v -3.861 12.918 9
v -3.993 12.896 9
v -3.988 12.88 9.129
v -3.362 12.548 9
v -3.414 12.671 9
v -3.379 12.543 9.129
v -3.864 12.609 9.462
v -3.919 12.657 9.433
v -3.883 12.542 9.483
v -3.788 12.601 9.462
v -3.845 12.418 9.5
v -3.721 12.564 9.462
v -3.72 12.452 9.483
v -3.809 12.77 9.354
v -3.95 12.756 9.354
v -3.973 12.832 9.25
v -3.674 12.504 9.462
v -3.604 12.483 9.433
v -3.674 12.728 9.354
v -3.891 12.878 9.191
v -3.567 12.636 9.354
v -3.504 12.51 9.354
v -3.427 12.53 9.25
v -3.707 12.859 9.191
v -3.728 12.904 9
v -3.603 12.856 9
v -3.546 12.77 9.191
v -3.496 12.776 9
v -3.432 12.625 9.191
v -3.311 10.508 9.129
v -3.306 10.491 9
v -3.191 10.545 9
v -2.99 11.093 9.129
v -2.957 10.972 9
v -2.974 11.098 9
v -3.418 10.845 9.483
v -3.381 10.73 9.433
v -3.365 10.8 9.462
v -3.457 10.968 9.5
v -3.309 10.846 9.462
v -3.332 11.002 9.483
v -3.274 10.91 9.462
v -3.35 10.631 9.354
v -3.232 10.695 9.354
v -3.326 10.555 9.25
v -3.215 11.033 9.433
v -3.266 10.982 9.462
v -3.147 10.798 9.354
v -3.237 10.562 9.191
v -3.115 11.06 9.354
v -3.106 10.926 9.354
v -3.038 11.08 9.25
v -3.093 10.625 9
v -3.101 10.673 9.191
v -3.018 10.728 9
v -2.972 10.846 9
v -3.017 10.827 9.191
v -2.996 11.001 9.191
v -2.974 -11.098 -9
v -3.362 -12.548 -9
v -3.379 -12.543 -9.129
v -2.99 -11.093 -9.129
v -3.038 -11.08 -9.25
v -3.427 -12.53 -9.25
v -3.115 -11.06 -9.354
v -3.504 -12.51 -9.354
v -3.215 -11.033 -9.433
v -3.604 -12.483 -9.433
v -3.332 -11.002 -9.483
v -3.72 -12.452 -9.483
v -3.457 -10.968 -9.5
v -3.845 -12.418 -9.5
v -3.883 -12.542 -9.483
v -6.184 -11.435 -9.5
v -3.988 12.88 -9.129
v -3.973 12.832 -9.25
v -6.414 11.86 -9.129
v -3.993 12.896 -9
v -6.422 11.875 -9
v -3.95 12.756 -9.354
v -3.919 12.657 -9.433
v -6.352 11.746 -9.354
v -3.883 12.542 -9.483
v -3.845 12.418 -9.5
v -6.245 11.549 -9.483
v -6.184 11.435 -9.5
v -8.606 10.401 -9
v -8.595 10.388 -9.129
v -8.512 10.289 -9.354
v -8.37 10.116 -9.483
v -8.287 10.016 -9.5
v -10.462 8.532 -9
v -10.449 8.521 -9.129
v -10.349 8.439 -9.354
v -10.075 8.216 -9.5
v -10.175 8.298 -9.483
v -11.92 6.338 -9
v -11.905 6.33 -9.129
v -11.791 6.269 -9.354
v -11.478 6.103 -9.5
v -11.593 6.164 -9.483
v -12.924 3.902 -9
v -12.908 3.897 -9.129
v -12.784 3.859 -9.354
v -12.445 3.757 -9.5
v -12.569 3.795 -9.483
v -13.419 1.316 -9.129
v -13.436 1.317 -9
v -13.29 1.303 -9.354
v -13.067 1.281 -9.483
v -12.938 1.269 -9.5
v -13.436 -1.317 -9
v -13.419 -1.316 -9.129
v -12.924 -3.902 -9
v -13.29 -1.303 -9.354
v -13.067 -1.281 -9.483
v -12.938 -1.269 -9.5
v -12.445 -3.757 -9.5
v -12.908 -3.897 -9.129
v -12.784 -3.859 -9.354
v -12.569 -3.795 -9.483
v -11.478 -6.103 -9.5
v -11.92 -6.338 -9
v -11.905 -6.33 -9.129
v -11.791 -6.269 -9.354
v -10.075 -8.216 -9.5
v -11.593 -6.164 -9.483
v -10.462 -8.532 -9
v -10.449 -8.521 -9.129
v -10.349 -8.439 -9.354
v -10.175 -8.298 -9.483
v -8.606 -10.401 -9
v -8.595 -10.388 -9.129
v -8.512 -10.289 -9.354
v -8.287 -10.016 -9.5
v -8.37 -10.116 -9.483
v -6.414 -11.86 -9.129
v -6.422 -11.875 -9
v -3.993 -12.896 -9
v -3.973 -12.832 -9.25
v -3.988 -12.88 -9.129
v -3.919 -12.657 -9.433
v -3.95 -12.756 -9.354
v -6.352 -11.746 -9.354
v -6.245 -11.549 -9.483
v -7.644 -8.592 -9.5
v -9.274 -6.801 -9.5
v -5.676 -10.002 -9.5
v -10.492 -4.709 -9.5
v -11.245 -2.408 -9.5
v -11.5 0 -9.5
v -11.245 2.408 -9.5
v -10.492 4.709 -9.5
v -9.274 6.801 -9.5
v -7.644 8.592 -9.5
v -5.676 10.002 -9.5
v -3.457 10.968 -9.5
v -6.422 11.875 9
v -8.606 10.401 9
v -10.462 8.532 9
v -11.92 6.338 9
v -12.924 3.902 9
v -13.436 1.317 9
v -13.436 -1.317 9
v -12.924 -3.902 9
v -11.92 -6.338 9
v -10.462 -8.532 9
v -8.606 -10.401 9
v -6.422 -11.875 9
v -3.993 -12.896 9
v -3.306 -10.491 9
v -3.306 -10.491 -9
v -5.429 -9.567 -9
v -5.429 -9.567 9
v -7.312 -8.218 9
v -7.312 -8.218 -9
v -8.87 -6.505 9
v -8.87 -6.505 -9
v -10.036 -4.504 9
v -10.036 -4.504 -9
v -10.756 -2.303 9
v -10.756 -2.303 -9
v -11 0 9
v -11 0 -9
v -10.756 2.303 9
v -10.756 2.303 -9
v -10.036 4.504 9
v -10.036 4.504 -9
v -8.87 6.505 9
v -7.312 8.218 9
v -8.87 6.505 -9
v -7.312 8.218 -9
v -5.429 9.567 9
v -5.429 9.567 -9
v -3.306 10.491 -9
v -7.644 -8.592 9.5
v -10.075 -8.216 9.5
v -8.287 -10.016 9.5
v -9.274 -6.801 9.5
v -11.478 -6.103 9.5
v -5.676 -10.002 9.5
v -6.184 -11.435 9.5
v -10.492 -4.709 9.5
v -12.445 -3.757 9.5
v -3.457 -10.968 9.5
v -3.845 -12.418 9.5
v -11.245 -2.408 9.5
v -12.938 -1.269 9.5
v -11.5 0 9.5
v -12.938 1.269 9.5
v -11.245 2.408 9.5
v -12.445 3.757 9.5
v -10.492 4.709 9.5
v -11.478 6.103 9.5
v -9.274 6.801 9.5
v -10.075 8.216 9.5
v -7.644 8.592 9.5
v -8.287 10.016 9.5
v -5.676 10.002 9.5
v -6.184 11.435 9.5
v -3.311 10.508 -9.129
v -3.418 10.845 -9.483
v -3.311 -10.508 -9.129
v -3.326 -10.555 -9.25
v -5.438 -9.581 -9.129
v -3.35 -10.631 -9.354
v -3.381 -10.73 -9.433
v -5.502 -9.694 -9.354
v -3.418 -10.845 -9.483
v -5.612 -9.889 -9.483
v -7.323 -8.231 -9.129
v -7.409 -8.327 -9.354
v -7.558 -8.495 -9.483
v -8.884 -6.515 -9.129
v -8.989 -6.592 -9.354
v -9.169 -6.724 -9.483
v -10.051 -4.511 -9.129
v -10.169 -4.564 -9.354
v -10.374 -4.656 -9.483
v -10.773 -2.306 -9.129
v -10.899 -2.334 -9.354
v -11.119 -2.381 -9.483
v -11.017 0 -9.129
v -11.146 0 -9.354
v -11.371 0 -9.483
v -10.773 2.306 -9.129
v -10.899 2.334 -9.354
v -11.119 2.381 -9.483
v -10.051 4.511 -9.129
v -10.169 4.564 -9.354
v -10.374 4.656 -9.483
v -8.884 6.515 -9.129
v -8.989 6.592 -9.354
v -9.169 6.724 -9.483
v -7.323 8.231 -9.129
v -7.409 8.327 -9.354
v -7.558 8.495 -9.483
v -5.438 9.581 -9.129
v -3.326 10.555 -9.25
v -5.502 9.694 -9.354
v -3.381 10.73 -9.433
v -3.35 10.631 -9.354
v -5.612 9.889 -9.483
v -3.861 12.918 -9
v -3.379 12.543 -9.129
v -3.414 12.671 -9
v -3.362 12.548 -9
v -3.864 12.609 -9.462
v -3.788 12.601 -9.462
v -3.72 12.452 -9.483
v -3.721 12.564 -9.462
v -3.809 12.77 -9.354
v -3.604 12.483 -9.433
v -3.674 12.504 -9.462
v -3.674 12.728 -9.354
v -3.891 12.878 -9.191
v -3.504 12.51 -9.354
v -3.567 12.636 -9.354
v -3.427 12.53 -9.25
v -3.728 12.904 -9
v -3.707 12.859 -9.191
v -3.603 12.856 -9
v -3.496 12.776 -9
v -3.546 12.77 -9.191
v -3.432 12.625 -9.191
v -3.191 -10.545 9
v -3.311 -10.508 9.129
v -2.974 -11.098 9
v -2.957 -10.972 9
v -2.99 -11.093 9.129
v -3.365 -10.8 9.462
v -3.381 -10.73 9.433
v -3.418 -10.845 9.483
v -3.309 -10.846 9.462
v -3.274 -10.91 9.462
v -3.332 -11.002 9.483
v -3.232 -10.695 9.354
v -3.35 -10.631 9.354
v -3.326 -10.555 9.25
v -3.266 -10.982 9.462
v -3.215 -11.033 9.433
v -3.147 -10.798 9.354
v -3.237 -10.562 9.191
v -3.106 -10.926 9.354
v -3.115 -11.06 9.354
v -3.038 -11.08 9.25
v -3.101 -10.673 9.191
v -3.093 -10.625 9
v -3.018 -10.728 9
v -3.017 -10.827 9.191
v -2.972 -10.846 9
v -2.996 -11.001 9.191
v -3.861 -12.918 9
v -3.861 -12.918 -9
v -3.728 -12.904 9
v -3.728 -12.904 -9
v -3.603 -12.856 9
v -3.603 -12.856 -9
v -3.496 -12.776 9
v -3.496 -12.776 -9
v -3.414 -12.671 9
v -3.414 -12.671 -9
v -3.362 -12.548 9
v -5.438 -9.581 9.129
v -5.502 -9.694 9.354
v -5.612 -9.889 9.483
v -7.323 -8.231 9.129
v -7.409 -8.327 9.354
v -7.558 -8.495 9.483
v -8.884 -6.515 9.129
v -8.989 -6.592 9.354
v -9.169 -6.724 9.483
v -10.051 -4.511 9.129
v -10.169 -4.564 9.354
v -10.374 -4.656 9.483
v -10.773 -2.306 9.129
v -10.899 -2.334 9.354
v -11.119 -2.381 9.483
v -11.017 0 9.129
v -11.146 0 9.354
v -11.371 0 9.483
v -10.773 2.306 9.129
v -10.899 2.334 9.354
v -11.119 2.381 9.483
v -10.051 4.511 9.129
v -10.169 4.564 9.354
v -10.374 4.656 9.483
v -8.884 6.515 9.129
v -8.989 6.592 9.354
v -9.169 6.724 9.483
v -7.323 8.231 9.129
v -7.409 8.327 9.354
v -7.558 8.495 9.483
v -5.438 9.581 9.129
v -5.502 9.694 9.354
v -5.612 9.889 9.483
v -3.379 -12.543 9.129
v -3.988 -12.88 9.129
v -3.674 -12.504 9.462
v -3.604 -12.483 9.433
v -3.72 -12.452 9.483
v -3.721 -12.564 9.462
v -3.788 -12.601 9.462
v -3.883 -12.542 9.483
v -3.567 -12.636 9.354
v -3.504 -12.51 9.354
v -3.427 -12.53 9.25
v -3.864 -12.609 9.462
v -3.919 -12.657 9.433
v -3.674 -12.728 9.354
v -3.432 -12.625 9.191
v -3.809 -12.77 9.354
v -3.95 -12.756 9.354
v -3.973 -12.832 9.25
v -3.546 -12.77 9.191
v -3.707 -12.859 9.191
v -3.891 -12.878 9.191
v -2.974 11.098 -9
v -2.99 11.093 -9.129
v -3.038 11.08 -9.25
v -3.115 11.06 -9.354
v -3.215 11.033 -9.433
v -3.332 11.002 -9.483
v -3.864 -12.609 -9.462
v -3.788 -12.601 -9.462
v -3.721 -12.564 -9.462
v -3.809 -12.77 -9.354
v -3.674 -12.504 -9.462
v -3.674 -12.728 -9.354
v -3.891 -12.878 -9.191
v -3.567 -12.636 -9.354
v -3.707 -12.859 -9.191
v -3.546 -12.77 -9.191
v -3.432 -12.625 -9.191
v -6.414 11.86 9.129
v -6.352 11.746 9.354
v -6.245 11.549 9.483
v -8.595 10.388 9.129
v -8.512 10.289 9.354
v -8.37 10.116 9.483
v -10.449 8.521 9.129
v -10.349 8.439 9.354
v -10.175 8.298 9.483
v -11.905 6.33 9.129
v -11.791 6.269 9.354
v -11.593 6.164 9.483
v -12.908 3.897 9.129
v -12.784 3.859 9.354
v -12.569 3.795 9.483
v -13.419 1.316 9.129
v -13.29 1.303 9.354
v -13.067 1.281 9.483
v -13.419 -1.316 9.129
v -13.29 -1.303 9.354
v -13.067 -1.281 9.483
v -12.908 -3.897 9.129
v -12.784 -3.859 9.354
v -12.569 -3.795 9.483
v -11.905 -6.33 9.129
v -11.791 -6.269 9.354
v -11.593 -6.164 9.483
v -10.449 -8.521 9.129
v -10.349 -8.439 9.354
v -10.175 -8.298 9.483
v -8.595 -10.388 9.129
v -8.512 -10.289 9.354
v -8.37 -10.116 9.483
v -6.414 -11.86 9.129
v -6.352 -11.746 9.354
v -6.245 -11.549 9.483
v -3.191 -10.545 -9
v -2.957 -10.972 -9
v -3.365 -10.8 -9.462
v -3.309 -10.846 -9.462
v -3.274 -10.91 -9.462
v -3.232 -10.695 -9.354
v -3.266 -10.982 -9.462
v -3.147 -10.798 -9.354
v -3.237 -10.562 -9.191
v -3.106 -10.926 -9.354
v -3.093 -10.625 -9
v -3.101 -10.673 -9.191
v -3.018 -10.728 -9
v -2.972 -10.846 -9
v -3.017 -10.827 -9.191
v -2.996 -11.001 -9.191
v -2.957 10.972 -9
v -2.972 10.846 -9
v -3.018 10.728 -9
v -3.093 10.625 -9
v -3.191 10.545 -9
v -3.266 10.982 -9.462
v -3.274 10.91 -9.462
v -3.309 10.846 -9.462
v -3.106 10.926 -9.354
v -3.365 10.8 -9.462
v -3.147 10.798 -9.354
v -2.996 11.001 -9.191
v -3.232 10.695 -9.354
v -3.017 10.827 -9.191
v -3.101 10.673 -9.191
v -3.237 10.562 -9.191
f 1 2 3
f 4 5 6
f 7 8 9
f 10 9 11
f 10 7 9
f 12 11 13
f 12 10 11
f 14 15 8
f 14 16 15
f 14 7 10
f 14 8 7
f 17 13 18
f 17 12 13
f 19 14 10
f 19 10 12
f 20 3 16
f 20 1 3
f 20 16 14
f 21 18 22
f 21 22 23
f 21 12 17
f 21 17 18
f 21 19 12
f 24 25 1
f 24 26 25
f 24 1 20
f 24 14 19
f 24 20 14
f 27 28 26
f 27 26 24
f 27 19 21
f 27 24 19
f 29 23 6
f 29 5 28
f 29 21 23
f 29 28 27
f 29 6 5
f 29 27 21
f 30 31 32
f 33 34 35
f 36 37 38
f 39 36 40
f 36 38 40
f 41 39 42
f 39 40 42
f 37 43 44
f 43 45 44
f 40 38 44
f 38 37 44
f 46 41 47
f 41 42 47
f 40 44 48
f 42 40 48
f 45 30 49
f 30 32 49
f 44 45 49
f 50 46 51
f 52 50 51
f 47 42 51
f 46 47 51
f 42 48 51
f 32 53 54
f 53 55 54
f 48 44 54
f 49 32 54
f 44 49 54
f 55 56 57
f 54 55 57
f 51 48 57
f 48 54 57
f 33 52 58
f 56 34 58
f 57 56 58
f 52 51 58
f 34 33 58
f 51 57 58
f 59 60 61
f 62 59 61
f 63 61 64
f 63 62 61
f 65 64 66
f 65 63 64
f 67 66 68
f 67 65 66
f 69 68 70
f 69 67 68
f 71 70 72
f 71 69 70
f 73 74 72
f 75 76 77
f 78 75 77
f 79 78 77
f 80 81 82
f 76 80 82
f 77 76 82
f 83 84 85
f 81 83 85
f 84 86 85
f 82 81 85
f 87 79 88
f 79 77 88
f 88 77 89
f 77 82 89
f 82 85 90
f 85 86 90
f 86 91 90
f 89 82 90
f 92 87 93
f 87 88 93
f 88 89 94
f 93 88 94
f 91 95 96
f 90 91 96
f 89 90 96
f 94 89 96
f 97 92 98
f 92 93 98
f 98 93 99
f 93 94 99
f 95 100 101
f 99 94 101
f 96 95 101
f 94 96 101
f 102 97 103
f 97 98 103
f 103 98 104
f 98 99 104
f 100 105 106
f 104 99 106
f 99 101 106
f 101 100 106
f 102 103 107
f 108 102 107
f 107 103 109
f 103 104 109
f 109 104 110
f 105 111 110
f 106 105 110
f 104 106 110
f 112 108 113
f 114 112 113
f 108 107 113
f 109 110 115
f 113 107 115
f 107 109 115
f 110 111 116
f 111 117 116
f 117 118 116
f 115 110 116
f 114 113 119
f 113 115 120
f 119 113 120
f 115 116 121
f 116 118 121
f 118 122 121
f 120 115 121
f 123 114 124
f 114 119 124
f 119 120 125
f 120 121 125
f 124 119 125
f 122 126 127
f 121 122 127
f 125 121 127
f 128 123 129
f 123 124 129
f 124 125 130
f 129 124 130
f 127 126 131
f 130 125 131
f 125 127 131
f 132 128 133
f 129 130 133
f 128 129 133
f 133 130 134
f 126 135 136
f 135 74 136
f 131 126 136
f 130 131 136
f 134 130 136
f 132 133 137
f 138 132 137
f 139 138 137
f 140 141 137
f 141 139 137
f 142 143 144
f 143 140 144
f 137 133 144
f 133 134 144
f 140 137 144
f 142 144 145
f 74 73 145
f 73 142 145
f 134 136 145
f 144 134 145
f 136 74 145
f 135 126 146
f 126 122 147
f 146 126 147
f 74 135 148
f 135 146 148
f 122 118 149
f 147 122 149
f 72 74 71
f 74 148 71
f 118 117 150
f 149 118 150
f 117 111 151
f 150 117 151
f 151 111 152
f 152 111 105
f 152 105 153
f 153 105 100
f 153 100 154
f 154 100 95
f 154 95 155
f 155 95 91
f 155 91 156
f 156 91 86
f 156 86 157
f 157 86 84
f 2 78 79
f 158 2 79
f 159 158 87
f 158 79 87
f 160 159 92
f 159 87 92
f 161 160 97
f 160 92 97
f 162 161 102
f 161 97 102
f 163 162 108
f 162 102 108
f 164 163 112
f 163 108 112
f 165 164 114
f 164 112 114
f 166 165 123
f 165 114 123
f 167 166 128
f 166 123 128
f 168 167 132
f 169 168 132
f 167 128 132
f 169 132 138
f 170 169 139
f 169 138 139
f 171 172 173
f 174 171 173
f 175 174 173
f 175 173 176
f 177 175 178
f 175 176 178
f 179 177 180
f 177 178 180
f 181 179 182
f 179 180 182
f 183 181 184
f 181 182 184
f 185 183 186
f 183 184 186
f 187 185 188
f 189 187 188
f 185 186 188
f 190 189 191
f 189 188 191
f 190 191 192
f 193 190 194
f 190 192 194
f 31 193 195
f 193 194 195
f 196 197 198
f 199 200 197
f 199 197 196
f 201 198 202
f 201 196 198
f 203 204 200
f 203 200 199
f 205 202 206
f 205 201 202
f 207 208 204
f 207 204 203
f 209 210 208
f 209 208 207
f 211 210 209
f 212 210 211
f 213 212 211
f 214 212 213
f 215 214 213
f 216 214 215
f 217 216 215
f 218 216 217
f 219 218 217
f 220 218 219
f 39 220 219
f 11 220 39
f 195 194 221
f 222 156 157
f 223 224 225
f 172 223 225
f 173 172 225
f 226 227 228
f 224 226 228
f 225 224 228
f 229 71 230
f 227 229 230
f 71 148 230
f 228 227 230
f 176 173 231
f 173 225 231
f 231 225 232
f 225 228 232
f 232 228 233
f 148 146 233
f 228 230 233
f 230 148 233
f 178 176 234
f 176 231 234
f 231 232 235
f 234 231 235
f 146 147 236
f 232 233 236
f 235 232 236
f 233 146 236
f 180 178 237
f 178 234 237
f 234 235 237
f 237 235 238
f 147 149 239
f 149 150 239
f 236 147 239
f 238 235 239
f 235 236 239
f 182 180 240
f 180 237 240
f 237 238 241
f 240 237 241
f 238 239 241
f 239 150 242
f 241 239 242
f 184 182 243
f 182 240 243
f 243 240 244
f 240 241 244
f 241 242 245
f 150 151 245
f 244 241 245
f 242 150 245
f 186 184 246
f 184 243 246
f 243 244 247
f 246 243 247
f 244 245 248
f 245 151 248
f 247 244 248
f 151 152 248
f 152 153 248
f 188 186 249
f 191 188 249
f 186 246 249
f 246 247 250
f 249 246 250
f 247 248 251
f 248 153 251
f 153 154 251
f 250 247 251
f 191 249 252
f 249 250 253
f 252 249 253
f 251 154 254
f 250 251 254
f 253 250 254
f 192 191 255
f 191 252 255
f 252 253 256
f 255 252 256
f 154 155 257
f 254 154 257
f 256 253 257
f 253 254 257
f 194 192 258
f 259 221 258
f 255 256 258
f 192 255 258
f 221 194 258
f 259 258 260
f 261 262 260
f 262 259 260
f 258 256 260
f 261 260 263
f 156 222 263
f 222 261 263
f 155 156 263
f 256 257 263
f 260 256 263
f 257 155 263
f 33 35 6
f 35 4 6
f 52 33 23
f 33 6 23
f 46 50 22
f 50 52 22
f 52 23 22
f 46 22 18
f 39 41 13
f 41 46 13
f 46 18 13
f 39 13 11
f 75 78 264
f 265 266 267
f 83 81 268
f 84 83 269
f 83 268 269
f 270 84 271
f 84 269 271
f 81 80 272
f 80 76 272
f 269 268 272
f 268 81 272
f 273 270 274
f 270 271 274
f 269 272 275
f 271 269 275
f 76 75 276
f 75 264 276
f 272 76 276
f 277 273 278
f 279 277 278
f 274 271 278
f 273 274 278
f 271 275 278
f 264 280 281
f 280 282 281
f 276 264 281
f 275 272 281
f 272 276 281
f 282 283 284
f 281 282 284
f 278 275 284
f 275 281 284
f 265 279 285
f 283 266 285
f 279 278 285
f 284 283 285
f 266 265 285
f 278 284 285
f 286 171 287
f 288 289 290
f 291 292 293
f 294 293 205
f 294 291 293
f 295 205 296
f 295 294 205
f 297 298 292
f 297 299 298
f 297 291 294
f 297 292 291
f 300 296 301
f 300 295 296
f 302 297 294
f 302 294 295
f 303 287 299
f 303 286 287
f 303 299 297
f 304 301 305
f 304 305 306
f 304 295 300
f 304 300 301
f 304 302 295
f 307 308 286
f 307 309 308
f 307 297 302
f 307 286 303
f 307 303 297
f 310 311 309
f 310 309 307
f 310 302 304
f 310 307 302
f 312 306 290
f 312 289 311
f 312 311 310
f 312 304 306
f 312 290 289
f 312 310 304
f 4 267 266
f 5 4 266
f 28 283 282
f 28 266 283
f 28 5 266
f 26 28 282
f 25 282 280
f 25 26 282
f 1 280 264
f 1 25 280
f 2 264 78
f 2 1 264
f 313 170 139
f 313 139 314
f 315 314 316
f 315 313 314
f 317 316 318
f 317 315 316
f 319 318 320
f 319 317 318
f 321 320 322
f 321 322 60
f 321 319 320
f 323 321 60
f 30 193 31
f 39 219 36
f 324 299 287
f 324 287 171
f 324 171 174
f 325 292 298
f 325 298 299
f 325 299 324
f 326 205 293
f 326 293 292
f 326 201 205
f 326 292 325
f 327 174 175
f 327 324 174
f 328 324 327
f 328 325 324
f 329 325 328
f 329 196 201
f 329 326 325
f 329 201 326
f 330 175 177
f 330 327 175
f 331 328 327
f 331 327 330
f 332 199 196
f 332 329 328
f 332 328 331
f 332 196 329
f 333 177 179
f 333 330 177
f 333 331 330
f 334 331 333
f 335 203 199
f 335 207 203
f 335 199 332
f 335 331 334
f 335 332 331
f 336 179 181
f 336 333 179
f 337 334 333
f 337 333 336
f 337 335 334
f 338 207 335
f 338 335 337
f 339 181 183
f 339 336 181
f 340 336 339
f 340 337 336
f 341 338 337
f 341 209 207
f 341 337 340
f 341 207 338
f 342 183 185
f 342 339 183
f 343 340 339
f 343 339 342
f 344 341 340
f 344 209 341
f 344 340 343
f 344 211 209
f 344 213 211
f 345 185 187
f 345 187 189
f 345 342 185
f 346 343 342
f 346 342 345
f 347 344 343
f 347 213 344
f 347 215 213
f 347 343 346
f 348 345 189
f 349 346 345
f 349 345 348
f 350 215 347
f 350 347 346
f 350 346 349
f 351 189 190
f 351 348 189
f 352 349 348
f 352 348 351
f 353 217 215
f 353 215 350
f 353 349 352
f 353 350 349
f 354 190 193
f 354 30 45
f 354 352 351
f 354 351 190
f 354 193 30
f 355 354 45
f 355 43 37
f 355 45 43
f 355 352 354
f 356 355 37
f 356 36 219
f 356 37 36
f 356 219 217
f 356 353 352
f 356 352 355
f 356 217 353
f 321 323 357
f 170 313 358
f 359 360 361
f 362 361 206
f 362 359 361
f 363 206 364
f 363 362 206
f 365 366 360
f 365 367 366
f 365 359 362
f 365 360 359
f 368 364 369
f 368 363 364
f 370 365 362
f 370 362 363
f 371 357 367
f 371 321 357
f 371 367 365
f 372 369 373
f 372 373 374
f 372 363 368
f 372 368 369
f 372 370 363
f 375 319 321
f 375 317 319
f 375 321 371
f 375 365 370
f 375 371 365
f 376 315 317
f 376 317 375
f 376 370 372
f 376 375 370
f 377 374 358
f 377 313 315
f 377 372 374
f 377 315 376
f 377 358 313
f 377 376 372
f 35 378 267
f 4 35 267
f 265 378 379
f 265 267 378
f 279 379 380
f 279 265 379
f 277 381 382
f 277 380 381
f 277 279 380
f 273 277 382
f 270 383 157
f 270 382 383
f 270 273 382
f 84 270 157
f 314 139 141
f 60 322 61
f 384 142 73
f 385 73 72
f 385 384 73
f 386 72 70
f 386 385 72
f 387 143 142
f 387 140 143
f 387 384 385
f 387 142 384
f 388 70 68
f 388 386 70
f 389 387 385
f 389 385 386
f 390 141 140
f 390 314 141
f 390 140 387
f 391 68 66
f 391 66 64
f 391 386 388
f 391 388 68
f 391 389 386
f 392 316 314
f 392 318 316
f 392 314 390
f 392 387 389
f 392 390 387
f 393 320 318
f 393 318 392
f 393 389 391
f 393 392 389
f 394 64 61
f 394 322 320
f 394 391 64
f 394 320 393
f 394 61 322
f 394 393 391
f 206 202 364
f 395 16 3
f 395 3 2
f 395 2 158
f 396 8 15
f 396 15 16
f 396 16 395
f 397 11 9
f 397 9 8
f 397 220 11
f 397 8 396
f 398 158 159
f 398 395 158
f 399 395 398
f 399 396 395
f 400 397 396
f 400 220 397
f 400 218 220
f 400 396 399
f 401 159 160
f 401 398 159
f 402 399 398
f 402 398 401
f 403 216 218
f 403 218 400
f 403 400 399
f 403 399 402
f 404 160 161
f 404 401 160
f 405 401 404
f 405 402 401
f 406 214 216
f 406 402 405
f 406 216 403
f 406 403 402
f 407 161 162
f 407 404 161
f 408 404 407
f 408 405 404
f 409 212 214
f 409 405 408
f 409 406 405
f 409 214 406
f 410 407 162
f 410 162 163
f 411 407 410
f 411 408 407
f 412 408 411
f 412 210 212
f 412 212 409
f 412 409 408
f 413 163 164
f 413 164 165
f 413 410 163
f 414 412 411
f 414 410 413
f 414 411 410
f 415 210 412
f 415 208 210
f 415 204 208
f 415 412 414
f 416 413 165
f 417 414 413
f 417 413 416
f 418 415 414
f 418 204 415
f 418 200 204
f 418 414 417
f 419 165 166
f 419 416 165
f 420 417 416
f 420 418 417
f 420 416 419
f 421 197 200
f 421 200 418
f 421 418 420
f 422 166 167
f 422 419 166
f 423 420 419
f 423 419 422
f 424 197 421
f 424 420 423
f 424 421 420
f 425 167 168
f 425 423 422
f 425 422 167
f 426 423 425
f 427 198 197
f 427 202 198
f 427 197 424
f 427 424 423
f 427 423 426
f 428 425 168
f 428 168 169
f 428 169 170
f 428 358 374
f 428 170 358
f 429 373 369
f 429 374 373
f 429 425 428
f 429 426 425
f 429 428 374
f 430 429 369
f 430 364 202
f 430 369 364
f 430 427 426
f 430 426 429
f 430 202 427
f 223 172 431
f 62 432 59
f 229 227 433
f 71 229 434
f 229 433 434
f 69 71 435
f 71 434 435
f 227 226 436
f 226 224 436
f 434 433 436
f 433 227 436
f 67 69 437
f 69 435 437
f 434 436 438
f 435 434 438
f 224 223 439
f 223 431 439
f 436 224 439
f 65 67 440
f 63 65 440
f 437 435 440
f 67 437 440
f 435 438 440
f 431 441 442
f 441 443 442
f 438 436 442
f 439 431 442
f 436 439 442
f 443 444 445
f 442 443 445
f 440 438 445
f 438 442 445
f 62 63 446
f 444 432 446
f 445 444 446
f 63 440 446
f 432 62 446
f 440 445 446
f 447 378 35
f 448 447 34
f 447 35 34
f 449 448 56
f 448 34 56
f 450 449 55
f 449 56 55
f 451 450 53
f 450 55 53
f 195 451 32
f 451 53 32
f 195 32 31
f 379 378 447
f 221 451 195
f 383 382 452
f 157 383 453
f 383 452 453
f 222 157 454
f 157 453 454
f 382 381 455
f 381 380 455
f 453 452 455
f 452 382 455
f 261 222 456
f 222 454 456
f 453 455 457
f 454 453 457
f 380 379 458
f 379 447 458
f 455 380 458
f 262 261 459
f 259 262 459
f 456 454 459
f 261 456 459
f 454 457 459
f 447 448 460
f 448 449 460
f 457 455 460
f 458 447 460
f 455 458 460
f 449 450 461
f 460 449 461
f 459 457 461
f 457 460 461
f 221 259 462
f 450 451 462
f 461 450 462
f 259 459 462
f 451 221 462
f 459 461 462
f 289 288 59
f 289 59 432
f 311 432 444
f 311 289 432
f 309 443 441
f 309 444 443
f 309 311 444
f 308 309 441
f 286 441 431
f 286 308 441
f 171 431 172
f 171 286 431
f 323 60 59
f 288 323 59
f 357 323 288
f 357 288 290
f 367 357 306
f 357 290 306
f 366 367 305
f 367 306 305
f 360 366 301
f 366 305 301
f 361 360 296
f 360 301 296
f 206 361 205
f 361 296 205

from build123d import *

# Parameters (mm, degrees)
REVOLVE1_START = -9.5
REVOLVE1_DEPTH = 19
FILLET1_R      = 0.5


# Read off the part's stored shape, not the designer's step: Revolve1
with BuildPart() as part:
    # Revolve1 outline → Revolve1 (new body)
    with BuildSketch(Plane.XY.offset(REVOLVE1_START)):
        with BuildLine():
            Line((-2.847009496, 10.625184089), (-3.494057109, 13.039998655))
            ThreePointArc((-3.494057109, 13.039998655), (-13.5, 0), (-3.494057109, -13.039998655))
            Line((-3.494057109, -13.039998655), (-2.847009496, -10.625184089))
            ThreePointArc((-2.847009496, -10.625184089), (-11, 0), (-2.847009496, 10.625184089))
        make_face()
    extrude(amount=REVOLVE1_DEPTH)

    # Fillet1
    fillet1_edges = [part.edges().sort_by_distance(p)[0] for p in [
        (-2.847009496, 10.625184089, 0),
        (-3.170533302, 11.832591372, -9.5),
        (-3.170533302, -11.832591372, -9.5),
        (-3.494057109, -13.039998655, 0),
        (-3.170533302, -11.832591372, 9.5),
        (-2.847009496, -10.625184089, 0),
        (-3.494057109, 13.039998655, 0),
        (-13.5, 0, -9.5),
        (-11, 0, -9.5),
        (-11, 0, 9.5),
        (-13.5, 0, 9.5),
        (-3.170533302, 11.832591372, 9.5),
    ]]
    fillet(fillet1_edges, radius=FILLET1_R)


solid = part.part
